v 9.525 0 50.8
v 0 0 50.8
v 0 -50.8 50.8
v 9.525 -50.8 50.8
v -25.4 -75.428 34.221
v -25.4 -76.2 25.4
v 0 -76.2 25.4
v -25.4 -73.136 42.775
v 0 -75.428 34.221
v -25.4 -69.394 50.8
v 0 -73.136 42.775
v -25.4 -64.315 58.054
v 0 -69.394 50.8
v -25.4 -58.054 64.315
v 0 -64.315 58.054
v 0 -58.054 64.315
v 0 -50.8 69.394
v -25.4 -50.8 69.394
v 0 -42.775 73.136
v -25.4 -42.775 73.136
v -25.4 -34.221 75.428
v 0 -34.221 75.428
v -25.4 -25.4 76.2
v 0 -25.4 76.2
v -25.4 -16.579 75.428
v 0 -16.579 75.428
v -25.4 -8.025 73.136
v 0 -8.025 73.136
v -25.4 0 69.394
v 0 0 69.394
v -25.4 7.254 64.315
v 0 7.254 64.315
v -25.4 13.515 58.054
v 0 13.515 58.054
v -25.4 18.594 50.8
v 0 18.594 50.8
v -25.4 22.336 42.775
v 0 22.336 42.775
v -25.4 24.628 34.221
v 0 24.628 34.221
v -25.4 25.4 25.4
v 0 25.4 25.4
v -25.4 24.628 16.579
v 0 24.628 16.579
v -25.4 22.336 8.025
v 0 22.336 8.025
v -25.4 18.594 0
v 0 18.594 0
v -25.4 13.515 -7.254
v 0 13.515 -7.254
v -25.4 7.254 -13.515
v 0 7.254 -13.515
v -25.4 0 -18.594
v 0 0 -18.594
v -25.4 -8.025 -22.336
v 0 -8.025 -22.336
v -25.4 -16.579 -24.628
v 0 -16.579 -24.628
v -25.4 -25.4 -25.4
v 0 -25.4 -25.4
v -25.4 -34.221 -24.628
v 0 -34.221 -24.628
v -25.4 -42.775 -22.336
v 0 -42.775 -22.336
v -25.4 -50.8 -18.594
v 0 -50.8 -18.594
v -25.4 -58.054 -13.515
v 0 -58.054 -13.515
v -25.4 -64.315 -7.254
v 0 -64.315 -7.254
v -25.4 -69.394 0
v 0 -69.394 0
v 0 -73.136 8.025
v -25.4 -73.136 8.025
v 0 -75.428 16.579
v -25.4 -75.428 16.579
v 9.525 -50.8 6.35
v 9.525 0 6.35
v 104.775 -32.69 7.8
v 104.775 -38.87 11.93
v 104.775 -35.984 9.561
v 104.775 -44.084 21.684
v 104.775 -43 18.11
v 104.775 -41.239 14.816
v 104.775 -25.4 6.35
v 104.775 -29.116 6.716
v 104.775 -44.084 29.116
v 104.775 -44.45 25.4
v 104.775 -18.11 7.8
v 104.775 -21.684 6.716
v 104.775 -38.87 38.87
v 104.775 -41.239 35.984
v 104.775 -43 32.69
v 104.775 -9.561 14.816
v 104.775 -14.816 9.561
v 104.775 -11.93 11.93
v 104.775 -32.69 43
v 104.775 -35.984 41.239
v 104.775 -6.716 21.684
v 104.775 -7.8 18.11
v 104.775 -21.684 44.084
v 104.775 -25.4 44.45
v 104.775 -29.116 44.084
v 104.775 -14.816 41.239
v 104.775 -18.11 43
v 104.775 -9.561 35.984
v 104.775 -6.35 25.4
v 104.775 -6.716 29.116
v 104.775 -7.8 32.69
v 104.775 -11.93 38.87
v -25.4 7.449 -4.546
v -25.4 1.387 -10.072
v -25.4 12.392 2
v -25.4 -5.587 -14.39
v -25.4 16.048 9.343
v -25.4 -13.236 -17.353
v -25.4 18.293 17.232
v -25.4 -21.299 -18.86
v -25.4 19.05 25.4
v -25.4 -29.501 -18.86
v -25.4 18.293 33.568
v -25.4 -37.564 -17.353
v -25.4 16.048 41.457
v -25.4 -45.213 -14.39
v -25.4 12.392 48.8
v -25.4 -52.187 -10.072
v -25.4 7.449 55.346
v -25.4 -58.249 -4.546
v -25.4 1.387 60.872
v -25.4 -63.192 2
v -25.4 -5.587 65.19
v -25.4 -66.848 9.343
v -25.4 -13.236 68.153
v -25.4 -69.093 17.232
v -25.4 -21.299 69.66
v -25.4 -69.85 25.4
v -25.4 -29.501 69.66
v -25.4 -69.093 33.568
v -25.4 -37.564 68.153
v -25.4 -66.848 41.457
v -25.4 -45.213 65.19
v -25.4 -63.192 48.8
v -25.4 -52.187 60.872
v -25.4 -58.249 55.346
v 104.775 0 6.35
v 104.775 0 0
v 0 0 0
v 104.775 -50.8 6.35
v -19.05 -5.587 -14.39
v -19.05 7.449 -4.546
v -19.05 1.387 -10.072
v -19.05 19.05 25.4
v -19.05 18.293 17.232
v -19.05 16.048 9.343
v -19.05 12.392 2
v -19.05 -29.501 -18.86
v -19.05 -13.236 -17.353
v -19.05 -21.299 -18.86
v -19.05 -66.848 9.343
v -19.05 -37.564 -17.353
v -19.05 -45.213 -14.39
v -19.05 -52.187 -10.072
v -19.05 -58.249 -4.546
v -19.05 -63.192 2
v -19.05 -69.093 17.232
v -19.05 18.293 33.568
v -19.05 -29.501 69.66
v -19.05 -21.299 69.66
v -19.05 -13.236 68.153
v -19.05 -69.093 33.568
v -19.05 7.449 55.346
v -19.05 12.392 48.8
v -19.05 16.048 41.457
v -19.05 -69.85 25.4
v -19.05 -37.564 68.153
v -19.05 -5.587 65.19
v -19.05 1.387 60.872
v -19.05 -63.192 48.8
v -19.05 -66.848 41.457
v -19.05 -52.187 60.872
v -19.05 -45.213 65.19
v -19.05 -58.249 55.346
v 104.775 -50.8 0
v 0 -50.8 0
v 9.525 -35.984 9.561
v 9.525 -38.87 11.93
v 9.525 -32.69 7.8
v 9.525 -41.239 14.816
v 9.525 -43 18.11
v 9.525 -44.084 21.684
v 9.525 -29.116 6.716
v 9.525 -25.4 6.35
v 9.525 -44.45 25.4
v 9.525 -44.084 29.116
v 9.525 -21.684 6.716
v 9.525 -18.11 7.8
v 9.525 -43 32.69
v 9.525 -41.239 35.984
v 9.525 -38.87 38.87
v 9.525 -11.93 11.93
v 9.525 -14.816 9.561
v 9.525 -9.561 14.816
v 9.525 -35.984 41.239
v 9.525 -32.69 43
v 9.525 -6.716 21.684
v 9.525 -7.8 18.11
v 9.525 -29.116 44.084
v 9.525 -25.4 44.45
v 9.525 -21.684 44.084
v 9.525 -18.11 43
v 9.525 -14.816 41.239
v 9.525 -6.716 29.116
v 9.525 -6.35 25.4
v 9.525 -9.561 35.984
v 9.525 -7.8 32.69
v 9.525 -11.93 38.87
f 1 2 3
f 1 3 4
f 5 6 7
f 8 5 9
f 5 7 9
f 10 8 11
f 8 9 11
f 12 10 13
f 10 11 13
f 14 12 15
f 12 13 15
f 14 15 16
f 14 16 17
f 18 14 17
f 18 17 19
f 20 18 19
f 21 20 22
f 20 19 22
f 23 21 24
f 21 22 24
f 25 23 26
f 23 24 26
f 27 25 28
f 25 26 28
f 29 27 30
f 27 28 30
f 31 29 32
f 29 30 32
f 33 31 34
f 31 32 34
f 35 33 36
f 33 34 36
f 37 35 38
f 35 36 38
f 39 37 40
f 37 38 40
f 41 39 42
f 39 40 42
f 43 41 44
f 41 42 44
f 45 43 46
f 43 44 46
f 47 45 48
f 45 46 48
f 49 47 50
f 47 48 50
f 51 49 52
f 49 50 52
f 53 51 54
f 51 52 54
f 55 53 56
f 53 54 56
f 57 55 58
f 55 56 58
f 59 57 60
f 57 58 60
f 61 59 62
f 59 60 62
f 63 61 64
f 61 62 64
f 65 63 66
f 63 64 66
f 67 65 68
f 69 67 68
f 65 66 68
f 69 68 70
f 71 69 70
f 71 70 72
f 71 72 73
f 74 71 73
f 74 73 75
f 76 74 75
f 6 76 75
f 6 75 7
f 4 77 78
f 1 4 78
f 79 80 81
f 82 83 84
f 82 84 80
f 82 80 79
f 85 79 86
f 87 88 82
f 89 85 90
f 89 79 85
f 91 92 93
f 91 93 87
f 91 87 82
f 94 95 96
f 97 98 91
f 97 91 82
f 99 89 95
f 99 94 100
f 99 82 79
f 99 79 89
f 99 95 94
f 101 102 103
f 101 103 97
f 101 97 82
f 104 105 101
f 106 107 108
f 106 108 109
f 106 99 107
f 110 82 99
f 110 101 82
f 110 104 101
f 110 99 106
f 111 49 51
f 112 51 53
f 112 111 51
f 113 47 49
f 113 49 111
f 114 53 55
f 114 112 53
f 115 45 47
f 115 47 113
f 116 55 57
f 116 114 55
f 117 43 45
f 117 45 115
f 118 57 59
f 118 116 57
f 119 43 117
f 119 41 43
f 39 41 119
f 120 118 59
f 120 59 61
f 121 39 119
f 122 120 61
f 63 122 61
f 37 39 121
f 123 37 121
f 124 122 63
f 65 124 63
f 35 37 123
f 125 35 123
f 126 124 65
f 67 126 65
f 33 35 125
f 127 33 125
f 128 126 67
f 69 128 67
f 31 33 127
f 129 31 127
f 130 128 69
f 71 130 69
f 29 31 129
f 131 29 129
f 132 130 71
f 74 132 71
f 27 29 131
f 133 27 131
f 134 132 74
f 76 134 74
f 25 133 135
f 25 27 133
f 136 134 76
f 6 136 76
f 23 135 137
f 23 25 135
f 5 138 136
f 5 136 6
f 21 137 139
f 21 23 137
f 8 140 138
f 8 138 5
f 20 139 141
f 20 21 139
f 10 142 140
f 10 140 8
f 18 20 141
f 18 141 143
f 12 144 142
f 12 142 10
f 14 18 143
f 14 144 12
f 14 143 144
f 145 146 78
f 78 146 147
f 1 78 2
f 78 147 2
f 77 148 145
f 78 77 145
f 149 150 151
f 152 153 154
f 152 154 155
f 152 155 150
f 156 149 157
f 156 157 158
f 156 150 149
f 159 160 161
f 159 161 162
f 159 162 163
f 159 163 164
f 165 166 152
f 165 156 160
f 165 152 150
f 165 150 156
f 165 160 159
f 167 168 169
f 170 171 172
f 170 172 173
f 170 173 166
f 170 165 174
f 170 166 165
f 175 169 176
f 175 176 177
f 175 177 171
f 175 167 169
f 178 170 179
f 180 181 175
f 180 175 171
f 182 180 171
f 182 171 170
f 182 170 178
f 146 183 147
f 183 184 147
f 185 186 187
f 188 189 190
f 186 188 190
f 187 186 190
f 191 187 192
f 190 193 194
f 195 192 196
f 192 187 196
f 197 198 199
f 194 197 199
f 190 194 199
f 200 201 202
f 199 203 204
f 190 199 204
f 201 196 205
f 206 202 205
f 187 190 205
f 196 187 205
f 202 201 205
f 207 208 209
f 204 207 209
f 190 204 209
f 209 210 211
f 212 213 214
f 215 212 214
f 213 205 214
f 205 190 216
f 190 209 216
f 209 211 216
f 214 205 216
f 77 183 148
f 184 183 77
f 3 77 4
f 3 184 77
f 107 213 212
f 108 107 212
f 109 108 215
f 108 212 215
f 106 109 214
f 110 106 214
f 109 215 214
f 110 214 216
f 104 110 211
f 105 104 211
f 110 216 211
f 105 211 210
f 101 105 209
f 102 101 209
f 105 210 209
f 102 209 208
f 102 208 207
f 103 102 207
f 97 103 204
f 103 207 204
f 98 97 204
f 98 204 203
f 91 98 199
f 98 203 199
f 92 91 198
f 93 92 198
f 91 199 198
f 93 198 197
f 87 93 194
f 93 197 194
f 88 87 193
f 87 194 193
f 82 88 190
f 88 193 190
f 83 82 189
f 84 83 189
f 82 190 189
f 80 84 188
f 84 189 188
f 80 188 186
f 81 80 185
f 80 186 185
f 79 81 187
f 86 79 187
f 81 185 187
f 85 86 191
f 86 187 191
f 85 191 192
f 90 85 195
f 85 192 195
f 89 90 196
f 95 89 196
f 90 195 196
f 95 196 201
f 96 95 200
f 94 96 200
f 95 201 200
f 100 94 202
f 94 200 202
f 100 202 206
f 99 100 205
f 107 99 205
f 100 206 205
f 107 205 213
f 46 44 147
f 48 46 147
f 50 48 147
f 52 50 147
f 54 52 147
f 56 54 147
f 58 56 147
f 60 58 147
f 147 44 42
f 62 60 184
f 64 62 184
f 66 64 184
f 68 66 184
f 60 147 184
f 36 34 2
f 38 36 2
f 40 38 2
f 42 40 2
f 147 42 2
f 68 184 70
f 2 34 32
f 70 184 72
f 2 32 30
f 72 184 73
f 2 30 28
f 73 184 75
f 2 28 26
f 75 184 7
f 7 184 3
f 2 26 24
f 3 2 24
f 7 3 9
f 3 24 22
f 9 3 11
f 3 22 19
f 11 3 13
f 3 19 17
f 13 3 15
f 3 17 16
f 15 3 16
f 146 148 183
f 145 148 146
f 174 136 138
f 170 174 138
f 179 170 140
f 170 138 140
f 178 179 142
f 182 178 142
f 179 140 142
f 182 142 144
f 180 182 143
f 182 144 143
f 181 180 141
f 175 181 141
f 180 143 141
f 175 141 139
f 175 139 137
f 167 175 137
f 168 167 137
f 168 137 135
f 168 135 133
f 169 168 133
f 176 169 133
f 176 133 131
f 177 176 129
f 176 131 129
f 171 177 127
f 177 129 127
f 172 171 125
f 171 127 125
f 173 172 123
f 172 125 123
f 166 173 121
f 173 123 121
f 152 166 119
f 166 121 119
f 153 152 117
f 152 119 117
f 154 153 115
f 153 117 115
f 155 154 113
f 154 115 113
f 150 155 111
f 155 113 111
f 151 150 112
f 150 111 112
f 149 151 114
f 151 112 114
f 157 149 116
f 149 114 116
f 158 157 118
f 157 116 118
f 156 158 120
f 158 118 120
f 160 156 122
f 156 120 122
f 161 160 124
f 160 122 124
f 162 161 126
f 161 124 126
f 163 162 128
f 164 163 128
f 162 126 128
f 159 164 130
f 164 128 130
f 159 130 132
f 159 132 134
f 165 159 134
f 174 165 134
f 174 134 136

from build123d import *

# Parameters (mm, degrees)
F0_W     = 9.525
F0_H     = 50.8
F1_DEPTH = 50.8
F2_W     = 50.8
F2_H     = 6.35
F3_DEPTH = 95.25
F4_R     = 50.8
F4_R_2   = 44.45
F5_DEPTH = 25.4
F6_R     = 44.45
F7_DEPTH = 6.35
F9_DEPTH = 95.25


with BuildPart() as f1:
    # F0 (on Top) → F1 (new body)
    with BuildSketch(Plane.XY):
        with Locations((4.7625, -25.4)):
            Rectangle(F0_W, F0_H)
    extrude(amount=F1_DEPTH)

    # F2 (on face) → F3 (join)
    with BuildSketch(Plane.YZ.offset(9.525)):
        with Locations((-25.4, 3.175)):
            Rectangle(F2_W, F2_H)
    extrude(amount=F3_DEPTH)

    # F4 (on face) → F5 (join)
    with BuildSketch(Plane(origin=(0, 0, 0), x_dir=(0, -1, 0), z_dir=(-1, 0, 0))):
        with Locations((25.4, 25.4)):
            Circle(F4_R)
        with Locations((25.4, 25.4)):
            Circle(F4_R_2, mode=Mode.SUBTRACT)
        with Locations((25.4, 25.4)):
            Circle(F4_R_2)
        Polygon((0, 25.4), (0, 50.8), (50.8, 50.8), (50.8, 0), (0, 0), align=None, mode=Mode.SUBTRACT)
        Polygon((50.8, 50.8), (0, 50.8), (0, 25.4), (0, 0), (50.8, 0), align=None)
    extrude(amount=F5_DEPTH)

    # F6 (on face) → F7 (cut)
    with BuildSketch(Plane(origin=(-25.4, 0, 0), x_dir=(0, -1, 0), z_dir=(-1, 0, 0))):
        with Locations((25.4, 25.4)):
            Circle(F6_R)
    extrude(amount=-F7_DEPTH, mode=Mode.SUBTRACT)


with BuildPart() as f9:
    # F8 (on face) → F9 (new body)
    with BuildSketch(Plane.YZ.offset(9.525)):
        with BuildLine():
            ThreePointArc((-6.35, 25.4), (-11.9296158184, 38.8703841816), (-25.4, 44.45))
            ThreePointArc((-25.4, 44.45), (-44.45, 25.4), (-25.4, 6.35))
            ThreePointArc((-25.4, 6.35), (-11.9296158184, 11.9296158184), (-6.35, 25.4))
        make_face()
    extrude(amount=F9_DEPTH)


solid = Compound([f1.part, f9.part])
